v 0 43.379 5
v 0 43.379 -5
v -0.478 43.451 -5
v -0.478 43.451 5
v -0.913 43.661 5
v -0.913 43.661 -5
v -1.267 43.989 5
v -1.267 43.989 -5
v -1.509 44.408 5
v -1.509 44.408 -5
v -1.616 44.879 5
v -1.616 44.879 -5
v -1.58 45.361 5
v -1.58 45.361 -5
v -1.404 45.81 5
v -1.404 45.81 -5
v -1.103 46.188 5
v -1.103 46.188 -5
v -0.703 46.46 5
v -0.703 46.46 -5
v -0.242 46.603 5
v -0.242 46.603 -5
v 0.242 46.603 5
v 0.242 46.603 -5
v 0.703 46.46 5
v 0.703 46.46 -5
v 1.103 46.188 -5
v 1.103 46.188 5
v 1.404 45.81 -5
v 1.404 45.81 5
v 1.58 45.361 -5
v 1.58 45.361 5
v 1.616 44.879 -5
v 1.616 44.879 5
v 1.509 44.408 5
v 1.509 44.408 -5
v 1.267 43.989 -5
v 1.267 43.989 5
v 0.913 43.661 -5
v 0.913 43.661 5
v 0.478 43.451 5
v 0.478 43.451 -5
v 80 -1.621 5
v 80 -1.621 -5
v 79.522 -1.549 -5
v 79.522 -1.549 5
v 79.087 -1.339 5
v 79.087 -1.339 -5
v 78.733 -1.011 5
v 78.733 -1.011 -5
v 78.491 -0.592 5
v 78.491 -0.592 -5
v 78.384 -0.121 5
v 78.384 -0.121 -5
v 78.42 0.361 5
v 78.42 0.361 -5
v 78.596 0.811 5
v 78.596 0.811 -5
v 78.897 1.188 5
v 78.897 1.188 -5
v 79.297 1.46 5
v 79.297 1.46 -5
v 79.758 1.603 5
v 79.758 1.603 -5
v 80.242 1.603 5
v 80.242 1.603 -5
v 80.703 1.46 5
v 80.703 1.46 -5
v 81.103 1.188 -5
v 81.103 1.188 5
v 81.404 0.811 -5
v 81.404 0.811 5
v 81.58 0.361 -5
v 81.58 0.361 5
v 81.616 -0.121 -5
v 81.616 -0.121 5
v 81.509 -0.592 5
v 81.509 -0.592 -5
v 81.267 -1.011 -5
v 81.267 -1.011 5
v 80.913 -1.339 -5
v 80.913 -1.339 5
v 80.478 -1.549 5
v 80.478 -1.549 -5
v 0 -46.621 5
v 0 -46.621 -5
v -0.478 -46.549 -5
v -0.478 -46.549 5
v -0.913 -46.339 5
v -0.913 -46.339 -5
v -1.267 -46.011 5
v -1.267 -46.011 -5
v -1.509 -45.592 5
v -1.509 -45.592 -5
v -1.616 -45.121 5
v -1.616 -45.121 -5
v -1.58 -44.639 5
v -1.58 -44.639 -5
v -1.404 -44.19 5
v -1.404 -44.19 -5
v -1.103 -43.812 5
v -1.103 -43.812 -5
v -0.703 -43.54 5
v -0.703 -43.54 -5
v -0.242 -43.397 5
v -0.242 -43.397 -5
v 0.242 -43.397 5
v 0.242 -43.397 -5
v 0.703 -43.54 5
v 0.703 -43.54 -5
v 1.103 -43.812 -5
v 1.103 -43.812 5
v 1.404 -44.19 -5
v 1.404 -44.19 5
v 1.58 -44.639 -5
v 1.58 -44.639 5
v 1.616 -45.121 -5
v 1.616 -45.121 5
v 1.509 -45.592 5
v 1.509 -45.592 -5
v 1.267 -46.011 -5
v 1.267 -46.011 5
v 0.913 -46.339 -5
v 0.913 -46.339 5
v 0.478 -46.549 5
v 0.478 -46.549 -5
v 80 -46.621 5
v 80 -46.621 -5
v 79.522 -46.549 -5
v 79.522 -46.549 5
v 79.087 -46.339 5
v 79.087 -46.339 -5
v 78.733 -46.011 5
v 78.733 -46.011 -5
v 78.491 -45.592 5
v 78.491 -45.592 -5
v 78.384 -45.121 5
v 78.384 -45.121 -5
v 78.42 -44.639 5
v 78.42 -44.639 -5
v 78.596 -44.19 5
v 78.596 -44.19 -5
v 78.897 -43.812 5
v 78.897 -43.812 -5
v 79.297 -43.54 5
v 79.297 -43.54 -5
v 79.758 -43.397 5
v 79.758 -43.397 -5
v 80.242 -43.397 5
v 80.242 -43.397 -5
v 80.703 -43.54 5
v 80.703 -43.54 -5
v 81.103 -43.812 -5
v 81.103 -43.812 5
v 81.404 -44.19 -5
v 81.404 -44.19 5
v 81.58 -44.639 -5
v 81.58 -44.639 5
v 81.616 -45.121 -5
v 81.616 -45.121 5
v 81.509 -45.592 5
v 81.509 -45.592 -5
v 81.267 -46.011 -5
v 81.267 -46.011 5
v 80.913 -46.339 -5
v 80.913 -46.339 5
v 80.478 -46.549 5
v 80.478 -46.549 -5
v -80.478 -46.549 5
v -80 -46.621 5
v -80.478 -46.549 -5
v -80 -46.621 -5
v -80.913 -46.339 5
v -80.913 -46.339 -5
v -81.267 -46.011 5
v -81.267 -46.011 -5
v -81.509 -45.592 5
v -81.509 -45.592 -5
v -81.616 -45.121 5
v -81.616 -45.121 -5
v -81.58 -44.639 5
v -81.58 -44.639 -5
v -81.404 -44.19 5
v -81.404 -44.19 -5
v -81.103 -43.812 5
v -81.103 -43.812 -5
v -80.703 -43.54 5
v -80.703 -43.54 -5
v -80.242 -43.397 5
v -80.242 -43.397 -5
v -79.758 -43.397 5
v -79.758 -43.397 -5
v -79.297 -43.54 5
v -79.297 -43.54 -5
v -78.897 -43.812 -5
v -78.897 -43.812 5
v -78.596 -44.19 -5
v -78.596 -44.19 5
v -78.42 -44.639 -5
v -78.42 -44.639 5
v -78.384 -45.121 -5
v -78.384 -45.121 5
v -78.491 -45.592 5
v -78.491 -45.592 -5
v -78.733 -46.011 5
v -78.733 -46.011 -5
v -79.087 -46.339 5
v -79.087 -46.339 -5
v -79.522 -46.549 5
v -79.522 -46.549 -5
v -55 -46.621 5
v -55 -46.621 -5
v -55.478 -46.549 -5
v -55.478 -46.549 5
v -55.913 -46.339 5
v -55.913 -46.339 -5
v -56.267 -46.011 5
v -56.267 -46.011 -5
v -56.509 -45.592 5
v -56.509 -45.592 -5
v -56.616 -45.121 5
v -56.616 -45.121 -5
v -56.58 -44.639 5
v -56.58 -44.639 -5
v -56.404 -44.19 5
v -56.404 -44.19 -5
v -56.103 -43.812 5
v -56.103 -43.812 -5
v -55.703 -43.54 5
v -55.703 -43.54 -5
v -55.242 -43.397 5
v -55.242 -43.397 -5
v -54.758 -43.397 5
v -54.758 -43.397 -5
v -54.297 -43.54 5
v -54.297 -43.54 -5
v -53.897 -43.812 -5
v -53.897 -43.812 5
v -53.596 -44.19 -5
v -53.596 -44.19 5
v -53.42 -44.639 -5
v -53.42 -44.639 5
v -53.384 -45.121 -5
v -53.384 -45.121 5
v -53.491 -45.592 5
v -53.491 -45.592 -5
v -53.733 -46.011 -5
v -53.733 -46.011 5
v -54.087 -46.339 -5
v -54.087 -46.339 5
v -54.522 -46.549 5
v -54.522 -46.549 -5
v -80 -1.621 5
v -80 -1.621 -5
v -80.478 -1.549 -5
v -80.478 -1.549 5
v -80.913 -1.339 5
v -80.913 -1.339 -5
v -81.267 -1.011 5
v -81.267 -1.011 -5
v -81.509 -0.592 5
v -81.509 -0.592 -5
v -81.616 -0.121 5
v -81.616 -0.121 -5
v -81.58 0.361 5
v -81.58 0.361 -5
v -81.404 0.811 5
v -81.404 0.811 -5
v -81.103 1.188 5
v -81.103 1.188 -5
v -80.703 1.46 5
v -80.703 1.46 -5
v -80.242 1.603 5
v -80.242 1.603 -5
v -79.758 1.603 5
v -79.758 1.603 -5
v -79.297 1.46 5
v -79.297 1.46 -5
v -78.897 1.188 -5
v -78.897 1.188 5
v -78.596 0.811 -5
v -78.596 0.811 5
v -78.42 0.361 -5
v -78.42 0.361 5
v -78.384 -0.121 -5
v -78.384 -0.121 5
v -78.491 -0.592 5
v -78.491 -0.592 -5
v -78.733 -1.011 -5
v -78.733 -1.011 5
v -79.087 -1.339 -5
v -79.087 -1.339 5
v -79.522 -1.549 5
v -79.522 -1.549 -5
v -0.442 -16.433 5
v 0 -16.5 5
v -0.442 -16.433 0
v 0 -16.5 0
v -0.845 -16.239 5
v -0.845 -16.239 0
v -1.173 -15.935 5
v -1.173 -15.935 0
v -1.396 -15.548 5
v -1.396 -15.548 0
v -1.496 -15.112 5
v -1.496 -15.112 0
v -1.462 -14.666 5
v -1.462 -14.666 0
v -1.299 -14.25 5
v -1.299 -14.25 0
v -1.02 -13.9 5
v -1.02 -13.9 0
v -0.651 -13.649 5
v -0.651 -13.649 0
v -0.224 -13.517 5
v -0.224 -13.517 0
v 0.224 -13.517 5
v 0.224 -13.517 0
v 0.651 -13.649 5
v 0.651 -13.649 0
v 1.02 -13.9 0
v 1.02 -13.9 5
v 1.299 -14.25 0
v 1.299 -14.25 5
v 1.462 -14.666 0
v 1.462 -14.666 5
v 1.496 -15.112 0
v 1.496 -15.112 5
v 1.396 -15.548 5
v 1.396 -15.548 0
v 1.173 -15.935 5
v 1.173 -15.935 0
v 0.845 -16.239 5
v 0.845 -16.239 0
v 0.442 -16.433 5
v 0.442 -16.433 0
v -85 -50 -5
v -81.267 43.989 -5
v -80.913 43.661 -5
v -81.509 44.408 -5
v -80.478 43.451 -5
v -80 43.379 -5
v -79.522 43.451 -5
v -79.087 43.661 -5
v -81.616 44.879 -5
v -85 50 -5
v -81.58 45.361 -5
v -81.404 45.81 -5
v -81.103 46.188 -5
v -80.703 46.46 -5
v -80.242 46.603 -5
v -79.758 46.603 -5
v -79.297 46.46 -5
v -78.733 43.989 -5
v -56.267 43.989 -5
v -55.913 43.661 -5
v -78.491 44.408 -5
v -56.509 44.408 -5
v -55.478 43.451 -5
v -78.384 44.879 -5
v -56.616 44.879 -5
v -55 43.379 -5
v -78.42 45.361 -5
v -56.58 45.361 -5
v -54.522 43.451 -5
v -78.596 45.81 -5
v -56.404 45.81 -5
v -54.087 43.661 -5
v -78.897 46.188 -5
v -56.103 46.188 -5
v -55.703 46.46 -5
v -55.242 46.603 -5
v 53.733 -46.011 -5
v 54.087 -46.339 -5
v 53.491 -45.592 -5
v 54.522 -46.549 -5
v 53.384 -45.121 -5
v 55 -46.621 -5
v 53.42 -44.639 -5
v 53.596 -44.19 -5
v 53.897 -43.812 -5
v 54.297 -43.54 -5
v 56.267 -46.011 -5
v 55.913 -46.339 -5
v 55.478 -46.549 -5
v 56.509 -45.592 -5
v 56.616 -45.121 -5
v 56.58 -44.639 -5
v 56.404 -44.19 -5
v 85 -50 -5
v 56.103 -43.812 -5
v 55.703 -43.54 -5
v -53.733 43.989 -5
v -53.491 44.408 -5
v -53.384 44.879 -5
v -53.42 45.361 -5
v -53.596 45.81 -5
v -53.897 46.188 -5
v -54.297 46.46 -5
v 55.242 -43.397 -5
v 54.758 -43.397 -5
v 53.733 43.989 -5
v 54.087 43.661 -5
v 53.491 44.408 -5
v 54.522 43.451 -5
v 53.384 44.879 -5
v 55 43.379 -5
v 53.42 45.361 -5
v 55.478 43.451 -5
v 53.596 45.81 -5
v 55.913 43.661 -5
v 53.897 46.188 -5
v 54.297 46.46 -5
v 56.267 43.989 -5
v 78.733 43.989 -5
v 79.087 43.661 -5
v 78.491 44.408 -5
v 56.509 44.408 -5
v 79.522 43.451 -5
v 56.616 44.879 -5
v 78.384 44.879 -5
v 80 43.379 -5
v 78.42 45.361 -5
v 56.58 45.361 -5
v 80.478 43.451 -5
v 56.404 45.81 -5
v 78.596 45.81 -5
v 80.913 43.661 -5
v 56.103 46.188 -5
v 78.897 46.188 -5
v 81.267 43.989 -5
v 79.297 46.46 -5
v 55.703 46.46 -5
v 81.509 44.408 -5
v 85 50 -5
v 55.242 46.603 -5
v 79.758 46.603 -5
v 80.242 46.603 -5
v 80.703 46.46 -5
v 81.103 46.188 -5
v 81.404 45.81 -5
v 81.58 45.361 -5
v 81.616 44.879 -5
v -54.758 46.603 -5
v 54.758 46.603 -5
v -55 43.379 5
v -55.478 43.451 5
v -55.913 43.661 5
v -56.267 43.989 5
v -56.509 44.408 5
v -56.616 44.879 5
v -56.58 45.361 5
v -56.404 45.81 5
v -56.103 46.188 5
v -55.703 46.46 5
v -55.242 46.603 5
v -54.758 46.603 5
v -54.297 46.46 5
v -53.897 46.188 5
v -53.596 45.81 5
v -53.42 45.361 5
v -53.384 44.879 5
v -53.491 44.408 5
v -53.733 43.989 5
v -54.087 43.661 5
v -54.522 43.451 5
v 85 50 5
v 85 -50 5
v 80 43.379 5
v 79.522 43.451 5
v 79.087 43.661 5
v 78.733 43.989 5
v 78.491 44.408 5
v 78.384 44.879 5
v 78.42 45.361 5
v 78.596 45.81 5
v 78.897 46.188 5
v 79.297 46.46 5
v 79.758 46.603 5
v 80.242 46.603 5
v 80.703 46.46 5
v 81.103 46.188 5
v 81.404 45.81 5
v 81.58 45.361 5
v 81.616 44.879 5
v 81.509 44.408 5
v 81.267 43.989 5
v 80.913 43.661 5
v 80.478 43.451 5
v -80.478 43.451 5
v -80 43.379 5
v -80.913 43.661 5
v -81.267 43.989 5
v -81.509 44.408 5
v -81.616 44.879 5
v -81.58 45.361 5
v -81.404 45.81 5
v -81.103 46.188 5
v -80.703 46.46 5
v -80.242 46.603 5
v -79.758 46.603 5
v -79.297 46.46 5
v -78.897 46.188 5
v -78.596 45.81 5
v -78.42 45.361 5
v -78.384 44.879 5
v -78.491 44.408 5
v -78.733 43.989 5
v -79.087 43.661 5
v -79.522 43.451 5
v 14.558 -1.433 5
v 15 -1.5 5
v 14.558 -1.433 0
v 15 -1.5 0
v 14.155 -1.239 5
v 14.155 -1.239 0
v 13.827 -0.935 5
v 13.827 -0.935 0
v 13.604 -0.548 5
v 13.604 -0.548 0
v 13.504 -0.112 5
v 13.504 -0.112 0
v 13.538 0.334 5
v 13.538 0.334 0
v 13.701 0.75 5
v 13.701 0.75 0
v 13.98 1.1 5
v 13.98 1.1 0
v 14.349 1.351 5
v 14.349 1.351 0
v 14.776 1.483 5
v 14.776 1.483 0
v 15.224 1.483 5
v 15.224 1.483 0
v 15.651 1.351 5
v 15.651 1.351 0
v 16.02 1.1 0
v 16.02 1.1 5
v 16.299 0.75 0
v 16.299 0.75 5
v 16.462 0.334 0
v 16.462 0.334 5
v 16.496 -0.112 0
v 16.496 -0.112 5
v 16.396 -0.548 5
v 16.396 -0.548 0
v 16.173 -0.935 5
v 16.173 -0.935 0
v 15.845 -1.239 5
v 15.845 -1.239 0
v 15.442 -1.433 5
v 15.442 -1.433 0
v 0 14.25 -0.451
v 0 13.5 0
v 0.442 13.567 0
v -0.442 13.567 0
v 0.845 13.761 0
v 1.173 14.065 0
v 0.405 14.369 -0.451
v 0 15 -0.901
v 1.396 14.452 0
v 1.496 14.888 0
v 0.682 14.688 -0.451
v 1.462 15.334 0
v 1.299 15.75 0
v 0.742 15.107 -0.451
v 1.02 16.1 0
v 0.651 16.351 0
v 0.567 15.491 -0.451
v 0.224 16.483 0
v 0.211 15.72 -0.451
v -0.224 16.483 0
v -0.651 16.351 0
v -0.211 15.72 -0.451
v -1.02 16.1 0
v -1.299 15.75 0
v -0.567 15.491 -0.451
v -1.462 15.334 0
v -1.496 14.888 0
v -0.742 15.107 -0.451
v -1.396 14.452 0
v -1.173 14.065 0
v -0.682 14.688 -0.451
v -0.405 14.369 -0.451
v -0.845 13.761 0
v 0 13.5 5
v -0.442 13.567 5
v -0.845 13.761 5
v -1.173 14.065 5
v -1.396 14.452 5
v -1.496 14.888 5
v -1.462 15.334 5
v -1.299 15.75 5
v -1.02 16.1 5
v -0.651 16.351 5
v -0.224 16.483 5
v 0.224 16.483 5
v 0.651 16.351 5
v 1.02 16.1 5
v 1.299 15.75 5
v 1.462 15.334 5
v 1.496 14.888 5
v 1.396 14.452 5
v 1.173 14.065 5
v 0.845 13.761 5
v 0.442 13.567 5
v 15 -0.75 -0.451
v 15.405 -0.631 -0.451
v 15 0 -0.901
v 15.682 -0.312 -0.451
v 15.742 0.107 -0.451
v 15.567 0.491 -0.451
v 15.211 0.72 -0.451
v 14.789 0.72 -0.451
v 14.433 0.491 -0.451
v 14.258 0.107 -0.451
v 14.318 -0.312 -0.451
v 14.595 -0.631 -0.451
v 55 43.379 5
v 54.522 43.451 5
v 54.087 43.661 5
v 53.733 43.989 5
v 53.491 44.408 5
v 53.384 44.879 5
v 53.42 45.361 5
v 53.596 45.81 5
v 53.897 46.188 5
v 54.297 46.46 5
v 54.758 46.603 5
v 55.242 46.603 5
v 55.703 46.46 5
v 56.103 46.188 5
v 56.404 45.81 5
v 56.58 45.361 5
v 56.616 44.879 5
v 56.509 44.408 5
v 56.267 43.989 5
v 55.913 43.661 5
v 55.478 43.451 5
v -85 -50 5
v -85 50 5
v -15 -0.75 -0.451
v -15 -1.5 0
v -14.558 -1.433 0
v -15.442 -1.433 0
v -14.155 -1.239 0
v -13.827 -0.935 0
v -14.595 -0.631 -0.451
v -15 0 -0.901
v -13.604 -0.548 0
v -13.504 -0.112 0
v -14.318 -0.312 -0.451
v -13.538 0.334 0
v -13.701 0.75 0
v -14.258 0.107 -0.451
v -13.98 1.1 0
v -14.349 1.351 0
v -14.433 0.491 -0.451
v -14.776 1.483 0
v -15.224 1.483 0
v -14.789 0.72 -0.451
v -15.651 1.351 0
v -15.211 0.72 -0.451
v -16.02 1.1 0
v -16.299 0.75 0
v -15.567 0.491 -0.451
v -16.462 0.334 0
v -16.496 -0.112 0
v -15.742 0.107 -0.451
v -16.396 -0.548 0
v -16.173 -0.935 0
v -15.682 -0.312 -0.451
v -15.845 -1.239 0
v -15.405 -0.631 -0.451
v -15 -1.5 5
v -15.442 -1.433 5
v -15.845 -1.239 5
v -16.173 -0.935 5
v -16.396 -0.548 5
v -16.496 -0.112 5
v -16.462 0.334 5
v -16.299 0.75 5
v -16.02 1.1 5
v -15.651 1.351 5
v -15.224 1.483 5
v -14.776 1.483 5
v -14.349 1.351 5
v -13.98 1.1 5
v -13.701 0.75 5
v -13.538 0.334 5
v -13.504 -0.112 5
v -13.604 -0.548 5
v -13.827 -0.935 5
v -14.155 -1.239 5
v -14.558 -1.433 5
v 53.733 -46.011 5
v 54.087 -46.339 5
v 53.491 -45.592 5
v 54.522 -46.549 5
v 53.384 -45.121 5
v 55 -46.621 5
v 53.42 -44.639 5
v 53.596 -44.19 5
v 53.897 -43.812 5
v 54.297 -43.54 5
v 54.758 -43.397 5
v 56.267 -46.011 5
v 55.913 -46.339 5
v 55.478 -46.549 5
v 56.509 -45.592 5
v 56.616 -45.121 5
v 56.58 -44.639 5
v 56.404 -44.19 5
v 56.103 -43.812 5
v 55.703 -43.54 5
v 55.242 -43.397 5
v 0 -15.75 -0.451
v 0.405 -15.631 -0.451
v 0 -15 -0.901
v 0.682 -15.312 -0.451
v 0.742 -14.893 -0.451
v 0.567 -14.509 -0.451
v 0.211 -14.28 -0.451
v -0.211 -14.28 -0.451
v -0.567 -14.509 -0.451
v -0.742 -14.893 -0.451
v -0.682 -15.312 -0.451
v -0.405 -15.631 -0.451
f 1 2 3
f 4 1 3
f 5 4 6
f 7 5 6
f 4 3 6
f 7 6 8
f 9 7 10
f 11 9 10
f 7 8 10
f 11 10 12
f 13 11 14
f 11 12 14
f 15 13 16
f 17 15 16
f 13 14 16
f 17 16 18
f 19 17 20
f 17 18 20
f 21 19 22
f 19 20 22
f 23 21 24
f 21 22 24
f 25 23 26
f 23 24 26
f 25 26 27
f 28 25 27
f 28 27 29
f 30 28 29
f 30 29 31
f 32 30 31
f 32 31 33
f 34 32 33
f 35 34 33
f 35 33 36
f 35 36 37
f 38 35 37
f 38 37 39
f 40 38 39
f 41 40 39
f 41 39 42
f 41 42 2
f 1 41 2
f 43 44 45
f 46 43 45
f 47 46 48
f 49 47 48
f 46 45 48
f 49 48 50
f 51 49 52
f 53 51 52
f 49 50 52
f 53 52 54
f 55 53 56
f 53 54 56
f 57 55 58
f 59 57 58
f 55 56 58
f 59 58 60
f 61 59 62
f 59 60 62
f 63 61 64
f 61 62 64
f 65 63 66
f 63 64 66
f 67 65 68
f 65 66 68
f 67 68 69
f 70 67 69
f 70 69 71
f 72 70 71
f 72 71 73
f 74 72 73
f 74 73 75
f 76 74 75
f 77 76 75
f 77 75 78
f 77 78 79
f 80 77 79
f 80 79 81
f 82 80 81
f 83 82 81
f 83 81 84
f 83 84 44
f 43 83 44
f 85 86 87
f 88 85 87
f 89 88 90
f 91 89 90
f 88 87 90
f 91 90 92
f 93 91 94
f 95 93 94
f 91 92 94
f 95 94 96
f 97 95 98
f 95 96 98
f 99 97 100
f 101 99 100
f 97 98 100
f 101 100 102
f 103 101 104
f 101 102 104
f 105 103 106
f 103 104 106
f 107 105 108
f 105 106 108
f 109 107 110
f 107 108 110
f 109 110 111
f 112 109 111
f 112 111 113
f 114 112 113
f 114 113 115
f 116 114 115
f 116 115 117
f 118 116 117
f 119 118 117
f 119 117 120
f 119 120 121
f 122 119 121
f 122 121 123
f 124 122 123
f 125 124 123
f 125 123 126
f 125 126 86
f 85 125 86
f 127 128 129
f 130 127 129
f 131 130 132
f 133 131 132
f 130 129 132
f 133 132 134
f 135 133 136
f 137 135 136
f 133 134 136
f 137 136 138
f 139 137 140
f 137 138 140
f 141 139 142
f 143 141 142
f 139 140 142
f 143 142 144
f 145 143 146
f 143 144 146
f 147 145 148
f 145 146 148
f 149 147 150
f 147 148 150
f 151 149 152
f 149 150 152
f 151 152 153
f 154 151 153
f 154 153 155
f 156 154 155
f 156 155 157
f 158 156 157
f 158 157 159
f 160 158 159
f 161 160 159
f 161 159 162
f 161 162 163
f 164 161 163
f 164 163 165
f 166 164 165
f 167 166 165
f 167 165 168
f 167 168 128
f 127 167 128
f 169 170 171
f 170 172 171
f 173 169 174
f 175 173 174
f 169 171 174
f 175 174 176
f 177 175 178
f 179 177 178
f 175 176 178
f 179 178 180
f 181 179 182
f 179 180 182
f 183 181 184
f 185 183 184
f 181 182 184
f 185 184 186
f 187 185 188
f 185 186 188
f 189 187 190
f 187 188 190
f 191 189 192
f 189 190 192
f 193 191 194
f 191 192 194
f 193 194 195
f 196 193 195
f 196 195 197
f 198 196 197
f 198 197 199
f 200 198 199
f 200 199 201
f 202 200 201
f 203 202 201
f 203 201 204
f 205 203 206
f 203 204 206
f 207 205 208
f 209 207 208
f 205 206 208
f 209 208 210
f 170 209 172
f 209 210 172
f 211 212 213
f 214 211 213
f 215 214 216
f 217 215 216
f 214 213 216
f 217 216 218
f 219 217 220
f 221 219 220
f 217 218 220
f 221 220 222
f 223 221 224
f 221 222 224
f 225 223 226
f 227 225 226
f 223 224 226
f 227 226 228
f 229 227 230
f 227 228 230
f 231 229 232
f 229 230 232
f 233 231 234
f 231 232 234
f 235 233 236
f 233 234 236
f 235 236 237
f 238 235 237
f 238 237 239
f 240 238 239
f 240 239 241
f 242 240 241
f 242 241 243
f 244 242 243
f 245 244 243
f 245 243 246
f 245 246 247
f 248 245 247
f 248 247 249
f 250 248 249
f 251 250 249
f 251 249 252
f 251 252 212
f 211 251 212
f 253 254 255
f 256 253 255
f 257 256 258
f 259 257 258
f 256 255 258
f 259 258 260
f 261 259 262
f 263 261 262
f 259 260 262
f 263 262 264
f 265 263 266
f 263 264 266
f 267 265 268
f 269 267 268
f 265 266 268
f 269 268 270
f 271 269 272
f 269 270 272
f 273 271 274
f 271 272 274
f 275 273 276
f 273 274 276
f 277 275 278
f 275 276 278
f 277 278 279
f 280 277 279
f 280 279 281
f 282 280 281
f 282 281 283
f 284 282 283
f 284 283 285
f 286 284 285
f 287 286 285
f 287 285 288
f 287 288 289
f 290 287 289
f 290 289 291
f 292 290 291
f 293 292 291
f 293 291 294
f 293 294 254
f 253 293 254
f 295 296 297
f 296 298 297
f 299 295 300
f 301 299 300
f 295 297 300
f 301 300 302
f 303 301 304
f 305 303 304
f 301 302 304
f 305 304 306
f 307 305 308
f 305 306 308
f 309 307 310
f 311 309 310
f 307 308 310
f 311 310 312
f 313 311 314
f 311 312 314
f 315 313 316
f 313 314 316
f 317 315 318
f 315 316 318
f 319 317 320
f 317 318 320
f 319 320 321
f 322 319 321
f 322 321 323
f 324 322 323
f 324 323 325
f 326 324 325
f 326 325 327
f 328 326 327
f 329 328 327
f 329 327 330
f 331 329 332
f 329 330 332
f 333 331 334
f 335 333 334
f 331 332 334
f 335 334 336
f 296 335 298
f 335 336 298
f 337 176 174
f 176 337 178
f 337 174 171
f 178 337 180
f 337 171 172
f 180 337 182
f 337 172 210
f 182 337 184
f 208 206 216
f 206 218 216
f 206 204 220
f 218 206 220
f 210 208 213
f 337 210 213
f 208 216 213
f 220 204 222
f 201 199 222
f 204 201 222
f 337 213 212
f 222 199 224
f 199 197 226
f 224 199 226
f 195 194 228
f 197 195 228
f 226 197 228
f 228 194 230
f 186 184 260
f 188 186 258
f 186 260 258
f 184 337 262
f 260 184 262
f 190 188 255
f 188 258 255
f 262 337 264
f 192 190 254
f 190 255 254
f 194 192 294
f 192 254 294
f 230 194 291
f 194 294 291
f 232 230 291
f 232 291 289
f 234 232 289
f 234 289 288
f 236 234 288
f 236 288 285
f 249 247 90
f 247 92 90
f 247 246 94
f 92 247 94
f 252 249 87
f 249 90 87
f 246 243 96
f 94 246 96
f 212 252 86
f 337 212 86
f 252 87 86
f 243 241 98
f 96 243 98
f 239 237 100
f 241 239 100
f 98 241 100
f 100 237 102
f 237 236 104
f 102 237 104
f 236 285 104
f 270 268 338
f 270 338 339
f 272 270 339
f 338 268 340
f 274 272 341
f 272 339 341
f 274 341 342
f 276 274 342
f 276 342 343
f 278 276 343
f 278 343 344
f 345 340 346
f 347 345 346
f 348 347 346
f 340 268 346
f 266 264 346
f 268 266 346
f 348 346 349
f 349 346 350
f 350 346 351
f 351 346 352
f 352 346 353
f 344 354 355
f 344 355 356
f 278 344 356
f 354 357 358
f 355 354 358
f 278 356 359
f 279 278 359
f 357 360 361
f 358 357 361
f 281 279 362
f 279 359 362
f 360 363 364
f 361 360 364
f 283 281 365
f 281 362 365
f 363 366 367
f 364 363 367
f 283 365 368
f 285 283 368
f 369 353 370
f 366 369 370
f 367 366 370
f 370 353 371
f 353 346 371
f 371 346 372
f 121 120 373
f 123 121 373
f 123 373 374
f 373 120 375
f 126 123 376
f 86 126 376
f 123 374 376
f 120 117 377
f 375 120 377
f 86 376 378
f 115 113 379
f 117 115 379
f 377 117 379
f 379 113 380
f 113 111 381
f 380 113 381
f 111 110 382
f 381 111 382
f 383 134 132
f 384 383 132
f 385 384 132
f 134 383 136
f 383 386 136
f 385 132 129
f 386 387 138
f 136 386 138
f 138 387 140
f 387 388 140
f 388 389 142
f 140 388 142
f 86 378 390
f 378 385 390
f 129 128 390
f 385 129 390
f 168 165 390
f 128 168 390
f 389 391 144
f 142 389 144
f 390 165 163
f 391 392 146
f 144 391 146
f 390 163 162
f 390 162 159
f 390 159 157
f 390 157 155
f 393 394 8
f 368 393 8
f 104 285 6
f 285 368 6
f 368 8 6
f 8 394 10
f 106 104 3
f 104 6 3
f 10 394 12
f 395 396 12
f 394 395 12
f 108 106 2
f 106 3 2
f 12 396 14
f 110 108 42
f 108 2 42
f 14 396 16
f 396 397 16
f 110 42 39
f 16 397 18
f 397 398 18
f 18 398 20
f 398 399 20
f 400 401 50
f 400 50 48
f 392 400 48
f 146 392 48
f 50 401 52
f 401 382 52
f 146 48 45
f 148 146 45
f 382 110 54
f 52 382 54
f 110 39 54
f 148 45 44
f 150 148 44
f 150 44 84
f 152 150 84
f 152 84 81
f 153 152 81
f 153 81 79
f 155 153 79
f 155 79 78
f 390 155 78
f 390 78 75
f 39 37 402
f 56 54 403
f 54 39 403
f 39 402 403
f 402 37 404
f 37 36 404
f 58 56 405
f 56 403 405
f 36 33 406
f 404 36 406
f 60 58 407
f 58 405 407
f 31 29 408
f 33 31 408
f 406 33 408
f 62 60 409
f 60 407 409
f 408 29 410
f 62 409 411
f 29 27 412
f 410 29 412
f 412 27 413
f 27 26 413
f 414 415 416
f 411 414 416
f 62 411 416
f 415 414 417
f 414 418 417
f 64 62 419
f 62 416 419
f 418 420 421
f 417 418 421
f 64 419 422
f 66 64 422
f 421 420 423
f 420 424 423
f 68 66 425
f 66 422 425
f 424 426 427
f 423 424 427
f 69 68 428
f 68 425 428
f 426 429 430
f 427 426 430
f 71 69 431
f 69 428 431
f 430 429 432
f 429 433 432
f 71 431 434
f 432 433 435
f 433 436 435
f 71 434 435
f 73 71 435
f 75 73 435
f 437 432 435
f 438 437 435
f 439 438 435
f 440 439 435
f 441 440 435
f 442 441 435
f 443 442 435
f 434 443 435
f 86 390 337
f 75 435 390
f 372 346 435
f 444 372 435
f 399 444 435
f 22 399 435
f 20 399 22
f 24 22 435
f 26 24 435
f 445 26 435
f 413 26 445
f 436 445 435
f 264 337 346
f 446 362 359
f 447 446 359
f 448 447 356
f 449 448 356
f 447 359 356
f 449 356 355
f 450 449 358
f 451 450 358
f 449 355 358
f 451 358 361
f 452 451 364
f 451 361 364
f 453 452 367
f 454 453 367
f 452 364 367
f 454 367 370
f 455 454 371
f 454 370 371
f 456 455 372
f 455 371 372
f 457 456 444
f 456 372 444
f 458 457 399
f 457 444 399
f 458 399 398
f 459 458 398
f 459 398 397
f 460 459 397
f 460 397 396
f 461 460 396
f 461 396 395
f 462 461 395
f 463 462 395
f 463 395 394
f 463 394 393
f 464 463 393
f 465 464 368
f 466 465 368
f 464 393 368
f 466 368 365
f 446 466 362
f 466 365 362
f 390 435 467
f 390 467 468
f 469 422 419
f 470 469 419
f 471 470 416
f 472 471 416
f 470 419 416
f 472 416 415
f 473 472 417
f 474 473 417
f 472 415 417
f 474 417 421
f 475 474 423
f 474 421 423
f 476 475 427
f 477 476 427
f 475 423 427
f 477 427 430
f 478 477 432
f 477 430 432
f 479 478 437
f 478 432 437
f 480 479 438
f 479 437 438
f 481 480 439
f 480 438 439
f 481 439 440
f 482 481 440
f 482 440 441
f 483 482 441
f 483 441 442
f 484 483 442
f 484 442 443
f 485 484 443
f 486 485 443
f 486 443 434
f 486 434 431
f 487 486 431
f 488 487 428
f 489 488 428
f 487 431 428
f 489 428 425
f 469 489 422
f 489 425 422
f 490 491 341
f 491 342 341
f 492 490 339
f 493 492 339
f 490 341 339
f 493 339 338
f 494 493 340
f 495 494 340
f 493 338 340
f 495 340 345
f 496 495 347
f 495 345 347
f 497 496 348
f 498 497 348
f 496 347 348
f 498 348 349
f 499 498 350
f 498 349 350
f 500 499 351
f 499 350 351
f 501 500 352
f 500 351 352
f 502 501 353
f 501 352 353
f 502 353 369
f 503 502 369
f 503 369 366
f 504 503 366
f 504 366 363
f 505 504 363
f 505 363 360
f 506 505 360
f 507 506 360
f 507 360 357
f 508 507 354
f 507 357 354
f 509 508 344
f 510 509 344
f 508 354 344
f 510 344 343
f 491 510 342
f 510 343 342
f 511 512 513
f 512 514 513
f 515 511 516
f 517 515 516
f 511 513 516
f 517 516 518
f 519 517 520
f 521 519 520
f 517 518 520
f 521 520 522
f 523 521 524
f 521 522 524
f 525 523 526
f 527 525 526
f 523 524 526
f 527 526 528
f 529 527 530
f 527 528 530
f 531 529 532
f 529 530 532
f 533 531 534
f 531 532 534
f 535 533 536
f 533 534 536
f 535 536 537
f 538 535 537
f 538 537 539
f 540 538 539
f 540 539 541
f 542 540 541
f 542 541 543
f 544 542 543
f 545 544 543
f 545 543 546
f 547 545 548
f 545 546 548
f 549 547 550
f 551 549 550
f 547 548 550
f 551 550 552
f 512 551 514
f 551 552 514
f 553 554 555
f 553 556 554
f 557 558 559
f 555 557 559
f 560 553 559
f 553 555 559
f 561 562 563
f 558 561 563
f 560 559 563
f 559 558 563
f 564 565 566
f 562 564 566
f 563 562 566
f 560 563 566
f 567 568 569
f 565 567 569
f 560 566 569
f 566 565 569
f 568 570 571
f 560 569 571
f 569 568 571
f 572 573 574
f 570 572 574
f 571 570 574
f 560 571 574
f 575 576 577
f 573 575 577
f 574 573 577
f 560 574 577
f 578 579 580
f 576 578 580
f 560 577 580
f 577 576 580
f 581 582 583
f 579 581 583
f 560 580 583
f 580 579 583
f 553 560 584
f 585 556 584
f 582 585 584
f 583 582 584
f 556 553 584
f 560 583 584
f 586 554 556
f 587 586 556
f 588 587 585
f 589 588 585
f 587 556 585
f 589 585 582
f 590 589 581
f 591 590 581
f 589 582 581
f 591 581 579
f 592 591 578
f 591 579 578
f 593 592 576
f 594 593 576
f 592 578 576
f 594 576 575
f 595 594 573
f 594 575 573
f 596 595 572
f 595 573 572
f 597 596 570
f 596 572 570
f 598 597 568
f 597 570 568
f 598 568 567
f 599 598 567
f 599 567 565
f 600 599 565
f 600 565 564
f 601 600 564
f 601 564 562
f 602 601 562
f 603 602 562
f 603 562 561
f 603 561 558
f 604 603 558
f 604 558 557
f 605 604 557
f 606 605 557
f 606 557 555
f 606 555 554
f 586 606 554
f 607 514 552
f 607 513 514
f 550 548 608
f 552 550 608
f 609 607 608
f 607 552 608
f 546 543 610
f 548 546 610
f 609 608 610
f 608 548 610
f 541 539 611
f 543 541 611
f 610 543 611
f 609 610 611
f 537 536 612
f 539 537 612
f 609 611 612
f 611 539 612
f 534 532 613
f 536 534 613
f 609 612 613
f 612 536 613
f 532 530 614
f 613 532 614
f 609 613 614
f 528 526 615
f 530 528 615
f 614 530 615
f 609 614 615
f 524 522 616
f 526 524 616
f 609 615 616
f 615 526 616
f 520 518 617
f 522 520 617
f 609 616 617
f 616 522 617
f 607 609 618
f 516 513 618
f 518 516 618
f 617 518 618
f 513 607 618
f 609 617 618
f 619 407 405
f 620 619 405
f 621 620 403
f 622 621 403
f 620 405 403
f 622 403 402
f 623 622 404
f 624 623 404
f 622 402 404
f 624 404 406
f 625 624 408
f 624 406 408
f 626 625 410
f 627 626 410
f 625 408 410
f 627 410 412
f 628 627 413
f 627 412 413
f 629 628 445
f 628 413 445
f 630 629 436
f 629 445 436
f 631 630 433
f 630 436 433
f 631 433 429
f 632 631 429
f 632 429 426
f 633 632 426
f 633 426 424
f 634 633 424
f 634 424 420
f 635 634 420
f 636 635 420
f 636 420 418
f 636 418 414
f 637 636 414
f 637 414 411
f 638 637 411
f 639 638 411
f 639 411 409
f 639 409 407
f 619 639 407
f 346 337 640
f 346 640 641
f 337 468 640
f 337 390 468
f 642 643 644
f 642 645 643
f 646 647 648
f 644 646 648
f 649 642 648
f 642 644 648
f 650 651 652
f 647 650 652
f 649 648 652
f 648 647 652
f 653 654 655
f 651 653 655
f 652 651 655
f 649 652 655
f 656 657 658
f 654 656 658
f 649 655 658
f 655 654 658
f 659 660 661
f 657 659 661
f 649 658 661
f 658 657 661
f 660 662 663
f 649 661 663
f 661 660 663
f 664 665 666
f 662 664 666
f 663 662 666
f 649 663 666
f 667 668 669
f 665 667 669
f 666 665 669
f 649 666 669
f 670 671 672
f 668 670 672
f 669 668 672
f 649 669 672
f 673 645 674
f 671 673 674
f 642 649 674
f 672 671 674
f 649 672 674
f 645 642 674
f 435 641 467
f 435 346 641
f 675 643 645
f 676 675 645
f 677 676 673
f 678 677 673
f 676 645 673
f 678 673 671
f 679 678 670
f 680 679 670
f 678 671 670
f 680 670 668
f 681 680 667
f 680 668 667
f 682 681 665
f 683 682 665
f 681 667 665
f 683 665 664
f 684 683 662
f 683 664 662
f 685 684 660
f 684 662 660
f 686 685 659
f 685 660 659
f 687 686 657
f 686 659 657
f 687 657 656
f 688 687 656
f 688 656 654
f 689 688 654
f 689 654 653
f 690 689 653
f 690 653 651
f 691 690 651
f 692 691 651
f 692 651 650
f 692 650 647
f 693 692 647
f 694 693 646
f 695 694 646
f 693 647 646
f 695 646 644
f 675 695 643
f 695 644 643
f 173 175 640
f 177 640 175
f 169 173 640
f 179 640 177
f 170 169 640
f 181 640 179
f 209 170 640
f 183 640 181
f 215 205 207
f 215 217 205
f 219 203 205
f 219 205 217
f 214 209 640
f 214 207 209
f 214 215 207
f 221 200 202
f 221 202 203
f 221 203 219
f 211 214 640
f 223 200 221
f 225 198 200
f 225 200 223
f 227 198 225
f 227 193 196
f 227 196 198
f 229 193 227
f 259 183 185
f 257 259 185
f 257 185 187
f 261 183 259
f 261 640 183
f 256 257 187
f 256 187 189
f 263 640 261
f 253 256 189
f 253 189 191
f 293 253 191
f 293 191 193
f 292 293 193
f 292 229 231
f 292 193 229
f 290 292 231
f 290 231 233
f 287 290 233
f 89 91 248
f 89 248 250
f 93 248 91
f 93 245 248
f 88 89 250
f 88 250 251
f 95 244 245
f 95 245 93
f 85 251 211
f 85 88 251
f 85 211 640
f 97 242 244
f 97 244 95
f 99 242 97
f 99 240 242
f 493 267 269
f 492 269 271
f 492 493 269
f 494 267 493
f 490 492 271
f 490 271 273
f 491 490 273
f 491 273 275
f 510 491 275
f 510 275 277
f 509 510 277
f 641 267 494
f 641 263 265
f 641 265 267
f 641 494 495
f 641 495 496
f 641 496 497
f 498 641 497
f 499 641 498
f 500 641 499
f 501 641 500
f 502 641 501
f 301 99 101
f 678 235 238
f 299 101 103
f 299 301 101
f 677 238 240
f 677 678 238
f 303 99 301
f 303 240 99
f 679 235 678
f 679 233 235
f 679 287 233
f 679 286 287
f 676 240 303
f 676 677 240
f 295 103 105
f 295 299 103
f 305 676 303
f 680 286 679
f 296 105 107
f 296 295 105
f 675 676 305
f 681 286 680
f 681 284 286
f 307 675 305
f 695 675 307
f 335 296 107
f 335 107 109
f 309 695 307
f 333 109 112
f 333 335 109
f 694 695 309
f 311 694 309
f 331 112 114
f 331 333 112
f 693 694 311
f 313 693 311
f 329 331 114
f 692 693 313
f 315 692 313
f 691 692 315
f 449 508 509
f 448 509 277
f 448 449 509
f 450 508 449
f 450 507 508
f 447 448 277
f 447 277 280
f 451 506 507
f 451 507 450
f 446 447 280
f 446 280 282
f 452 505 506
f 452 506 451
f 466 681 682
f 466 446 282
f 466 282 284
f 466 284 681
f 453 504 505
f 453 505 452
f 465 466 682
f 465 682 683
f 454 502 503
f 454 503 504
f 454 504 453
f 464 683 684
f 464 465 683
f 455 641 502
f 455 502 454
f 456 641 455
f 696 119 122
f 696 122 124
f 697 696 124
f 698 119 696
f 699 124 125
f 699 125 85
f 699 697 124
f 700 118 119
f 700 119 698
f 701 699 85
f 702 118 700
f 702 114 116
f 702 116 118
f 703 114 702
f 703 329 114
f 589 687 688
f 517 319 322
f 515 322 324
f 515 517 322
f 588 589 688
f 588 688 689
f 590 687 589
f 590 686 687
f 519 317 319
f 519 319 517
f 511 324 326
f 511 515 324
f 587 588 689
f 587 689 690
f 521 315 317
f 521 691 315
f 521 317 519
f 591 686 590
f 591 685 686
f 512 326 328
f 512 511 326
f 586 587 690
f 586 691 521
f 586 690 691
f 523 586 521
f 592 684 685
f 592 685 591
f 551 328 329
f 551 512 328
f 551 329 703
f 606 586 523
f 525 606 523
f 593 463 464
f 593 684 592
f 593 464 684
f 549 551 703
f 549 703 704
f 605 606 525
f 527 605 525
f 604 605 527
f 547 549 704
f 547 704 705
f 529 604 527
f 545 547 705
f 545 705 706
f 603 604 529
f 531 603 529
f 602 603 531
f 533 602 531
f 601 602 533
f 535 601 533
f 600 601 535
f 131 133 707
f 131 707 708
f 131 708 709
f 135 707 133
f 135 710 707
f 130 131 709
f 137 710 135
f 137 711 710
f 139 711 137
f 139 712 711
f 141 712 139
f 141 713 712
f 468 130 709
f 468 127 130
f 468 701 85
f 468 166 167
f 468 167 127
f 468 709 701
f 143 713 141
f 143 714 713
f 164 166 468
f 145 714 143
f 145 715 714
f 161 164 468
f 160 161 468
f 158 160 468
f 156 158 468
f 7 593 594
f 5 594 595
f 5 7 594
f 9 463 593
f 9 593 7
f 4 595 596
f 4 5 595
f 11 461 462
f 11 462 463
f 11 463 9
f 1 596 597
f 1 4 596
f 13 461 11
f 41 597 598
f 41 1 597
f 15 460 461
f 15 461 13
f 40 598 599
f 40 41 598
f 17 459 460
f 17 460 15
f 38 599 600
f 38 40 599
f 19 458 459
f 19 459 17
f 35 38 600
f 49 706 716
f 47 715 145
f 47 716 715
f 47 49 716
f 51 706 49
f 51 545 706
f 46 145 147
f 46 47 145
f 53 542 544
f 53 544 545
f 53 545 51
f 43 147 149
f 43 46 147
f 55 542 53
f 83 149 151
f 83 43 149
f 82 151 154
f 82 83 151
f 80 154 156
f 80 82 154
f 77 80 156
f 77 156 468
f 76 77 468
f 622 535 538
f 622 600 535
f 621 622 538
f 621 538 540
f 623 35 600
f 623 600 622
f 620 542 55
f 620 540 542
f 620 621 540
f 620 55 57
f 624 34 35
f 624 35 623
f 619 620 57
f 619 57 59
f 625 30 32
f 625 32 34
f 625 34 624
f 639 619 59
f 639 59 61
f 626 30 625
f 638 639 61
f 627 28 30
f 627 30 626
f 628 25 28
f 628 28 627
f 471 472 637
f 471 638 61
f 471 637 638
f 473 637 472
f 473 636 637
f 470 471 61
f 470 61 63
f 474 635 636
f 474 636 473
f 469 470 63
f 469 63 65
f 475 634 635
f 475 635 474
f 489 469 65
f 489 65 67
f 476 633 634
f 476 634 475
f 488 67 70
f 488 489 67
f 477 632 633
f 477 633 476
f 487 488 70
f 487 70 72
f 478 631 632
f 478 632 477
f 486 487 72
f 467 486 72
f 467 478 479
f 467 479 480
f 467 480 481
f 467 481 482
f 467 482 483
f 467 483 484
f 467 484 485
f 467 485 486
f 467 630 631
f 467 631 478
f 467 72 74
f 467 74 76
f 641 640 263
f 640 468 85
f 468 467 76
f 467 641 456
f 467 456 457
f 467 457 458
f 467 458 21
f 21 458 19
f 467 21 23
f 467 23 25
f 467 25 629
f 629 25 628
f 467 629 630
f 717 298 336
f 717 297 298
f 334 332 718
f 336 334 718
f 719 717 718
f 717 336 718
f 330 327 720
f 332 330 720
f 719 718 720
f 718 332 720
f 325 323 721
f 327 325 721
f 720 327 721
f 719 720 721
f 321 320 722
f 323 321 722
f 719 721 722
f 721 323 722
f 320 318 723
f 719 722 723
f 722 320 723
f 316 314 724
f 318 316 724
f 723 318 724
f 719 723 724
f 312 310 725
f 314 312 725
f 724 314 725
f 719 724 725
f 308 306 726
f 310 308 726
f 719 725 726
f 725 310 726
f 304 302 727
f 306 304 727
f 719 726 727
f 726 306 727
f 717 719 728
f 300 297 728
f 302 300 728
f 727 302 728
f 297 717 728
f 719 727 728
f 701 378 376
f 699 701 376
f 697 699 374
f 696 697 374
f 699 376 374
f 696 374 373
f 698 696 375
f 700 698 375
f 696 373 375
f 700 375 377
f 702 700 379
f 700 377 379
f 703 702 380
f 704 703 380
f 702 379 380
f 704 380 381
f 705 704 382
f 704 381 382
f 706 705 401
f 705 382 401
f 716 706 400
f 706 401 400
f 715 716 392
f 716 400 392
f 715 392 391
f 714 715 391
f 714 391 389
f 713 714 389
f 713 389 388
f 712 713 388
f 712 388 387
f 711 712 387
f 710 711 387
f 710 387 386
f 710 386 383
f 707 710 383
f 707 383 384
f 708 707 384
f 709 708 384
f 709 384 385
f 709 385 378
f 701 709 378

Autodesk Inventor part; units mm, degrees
ref_plane "YZ Plane" through (0, 0, 0) normal (1, 0, 0) x (0, 1, 0)
ref_plane "XZ Plane" through (0, 0, 0) normal (0, 1, 0) x (-1, 0, 0)
ref_plane "XY Plane" through (0, 0, 0) normal (0, 0, 1) x (1, 0, 0)
sketch "Sketch1" plane through (0, 0, 0) normal (0, 0, 1) x (1, 0, 0)
  line L0 (-85, 50) -> (85, 50)
  line L1 (85, 50) -> (85, -50)
  line L2 (85, -50) -> (-85, -50)
  line L3 (-85, -50) -> (-85, 50)
  line L4 (-85, 50) -> (85, -50) construction
  line L5 (85, 50) -> (-85, -50) construction
  point P0 (0, 0)
  dimension "d0" = 170
  dimension "d1" = 100
extrude "Extrusion1" add sketch "Sketch1" along normal mid plane 10
sketch "Sketch2" plane through (0, 0, 5) normal (0, 0, 1) x (1, 0, 0)
  line L0 (-85, 50) -> (-85, -50) projected
  line L1 (-85, -50) -> (85, -50) projected
  line L2 (85, -50) -> (85, 50) projected
  line L3 (85, 50) -> (-85, 50) projected
  point P0 (0, 0)
  point P1 (-80, -45)
  point P2 (0, -45)
  point P3 (-55, -45)
  point P4 (55, -45)
  point P5 (0, -45)
  point P6 (80, -45)
  point P7 (-80, 0)
  point P8 (80, 0)
  point P9 (-80, 45)
  point P10 (80, 45)
  point P11 (-55, 45)
  point P12 (0, 45)
  point P13 (55, 45)
  dimension "d4" = 5
  dimension "d5" = 5
  dimension "d8" = 80
  dimension "d13" = 25
  dimension "d14" = 5
  dimension "d16" = 5
  dimension "d60" = 5
  dimension "d61" = 5
  dimension "d62" = 25
  dimension "d65" = 45
  dimension "d72" = 90
hole "Hole1" at (-80, -45, 5) at (0, -45, 5) at (-55, -45, 5) at (55, -45, 5) at (-80, 45, 5) at (-80, 0, 5) at (-55, 45, 5) at (0, 45, 5) at (55, 45, 5) at (80, 45, 5) at (80, 0, 5) at (80, -45, 5) direction (0, 0, -1) diameter 3.242 end through all thread size "M4x0.7" class "6H" standard "ANSI Metric M Profile"
sketch "Sketch3" plane through (0, 0, 5) normal (0, 0, 1) x (1, 0, 0)
  point P0 (0, 0)
  point P1 (0, 15)
  point P2 (-15, 0)
  point P3 (0, -15)
  point P4 (15, 0)
  dimension "d105" = 15
  dimension "d108" = 360
hole "Hole2" at (0, 15, 5) at (-15, 0, 5) at (0, -15, 5) at (15, 0, 5) direction (0, 0, -1) diameter 3 depth 5 tip angle 118
properties part number "topwindow"
